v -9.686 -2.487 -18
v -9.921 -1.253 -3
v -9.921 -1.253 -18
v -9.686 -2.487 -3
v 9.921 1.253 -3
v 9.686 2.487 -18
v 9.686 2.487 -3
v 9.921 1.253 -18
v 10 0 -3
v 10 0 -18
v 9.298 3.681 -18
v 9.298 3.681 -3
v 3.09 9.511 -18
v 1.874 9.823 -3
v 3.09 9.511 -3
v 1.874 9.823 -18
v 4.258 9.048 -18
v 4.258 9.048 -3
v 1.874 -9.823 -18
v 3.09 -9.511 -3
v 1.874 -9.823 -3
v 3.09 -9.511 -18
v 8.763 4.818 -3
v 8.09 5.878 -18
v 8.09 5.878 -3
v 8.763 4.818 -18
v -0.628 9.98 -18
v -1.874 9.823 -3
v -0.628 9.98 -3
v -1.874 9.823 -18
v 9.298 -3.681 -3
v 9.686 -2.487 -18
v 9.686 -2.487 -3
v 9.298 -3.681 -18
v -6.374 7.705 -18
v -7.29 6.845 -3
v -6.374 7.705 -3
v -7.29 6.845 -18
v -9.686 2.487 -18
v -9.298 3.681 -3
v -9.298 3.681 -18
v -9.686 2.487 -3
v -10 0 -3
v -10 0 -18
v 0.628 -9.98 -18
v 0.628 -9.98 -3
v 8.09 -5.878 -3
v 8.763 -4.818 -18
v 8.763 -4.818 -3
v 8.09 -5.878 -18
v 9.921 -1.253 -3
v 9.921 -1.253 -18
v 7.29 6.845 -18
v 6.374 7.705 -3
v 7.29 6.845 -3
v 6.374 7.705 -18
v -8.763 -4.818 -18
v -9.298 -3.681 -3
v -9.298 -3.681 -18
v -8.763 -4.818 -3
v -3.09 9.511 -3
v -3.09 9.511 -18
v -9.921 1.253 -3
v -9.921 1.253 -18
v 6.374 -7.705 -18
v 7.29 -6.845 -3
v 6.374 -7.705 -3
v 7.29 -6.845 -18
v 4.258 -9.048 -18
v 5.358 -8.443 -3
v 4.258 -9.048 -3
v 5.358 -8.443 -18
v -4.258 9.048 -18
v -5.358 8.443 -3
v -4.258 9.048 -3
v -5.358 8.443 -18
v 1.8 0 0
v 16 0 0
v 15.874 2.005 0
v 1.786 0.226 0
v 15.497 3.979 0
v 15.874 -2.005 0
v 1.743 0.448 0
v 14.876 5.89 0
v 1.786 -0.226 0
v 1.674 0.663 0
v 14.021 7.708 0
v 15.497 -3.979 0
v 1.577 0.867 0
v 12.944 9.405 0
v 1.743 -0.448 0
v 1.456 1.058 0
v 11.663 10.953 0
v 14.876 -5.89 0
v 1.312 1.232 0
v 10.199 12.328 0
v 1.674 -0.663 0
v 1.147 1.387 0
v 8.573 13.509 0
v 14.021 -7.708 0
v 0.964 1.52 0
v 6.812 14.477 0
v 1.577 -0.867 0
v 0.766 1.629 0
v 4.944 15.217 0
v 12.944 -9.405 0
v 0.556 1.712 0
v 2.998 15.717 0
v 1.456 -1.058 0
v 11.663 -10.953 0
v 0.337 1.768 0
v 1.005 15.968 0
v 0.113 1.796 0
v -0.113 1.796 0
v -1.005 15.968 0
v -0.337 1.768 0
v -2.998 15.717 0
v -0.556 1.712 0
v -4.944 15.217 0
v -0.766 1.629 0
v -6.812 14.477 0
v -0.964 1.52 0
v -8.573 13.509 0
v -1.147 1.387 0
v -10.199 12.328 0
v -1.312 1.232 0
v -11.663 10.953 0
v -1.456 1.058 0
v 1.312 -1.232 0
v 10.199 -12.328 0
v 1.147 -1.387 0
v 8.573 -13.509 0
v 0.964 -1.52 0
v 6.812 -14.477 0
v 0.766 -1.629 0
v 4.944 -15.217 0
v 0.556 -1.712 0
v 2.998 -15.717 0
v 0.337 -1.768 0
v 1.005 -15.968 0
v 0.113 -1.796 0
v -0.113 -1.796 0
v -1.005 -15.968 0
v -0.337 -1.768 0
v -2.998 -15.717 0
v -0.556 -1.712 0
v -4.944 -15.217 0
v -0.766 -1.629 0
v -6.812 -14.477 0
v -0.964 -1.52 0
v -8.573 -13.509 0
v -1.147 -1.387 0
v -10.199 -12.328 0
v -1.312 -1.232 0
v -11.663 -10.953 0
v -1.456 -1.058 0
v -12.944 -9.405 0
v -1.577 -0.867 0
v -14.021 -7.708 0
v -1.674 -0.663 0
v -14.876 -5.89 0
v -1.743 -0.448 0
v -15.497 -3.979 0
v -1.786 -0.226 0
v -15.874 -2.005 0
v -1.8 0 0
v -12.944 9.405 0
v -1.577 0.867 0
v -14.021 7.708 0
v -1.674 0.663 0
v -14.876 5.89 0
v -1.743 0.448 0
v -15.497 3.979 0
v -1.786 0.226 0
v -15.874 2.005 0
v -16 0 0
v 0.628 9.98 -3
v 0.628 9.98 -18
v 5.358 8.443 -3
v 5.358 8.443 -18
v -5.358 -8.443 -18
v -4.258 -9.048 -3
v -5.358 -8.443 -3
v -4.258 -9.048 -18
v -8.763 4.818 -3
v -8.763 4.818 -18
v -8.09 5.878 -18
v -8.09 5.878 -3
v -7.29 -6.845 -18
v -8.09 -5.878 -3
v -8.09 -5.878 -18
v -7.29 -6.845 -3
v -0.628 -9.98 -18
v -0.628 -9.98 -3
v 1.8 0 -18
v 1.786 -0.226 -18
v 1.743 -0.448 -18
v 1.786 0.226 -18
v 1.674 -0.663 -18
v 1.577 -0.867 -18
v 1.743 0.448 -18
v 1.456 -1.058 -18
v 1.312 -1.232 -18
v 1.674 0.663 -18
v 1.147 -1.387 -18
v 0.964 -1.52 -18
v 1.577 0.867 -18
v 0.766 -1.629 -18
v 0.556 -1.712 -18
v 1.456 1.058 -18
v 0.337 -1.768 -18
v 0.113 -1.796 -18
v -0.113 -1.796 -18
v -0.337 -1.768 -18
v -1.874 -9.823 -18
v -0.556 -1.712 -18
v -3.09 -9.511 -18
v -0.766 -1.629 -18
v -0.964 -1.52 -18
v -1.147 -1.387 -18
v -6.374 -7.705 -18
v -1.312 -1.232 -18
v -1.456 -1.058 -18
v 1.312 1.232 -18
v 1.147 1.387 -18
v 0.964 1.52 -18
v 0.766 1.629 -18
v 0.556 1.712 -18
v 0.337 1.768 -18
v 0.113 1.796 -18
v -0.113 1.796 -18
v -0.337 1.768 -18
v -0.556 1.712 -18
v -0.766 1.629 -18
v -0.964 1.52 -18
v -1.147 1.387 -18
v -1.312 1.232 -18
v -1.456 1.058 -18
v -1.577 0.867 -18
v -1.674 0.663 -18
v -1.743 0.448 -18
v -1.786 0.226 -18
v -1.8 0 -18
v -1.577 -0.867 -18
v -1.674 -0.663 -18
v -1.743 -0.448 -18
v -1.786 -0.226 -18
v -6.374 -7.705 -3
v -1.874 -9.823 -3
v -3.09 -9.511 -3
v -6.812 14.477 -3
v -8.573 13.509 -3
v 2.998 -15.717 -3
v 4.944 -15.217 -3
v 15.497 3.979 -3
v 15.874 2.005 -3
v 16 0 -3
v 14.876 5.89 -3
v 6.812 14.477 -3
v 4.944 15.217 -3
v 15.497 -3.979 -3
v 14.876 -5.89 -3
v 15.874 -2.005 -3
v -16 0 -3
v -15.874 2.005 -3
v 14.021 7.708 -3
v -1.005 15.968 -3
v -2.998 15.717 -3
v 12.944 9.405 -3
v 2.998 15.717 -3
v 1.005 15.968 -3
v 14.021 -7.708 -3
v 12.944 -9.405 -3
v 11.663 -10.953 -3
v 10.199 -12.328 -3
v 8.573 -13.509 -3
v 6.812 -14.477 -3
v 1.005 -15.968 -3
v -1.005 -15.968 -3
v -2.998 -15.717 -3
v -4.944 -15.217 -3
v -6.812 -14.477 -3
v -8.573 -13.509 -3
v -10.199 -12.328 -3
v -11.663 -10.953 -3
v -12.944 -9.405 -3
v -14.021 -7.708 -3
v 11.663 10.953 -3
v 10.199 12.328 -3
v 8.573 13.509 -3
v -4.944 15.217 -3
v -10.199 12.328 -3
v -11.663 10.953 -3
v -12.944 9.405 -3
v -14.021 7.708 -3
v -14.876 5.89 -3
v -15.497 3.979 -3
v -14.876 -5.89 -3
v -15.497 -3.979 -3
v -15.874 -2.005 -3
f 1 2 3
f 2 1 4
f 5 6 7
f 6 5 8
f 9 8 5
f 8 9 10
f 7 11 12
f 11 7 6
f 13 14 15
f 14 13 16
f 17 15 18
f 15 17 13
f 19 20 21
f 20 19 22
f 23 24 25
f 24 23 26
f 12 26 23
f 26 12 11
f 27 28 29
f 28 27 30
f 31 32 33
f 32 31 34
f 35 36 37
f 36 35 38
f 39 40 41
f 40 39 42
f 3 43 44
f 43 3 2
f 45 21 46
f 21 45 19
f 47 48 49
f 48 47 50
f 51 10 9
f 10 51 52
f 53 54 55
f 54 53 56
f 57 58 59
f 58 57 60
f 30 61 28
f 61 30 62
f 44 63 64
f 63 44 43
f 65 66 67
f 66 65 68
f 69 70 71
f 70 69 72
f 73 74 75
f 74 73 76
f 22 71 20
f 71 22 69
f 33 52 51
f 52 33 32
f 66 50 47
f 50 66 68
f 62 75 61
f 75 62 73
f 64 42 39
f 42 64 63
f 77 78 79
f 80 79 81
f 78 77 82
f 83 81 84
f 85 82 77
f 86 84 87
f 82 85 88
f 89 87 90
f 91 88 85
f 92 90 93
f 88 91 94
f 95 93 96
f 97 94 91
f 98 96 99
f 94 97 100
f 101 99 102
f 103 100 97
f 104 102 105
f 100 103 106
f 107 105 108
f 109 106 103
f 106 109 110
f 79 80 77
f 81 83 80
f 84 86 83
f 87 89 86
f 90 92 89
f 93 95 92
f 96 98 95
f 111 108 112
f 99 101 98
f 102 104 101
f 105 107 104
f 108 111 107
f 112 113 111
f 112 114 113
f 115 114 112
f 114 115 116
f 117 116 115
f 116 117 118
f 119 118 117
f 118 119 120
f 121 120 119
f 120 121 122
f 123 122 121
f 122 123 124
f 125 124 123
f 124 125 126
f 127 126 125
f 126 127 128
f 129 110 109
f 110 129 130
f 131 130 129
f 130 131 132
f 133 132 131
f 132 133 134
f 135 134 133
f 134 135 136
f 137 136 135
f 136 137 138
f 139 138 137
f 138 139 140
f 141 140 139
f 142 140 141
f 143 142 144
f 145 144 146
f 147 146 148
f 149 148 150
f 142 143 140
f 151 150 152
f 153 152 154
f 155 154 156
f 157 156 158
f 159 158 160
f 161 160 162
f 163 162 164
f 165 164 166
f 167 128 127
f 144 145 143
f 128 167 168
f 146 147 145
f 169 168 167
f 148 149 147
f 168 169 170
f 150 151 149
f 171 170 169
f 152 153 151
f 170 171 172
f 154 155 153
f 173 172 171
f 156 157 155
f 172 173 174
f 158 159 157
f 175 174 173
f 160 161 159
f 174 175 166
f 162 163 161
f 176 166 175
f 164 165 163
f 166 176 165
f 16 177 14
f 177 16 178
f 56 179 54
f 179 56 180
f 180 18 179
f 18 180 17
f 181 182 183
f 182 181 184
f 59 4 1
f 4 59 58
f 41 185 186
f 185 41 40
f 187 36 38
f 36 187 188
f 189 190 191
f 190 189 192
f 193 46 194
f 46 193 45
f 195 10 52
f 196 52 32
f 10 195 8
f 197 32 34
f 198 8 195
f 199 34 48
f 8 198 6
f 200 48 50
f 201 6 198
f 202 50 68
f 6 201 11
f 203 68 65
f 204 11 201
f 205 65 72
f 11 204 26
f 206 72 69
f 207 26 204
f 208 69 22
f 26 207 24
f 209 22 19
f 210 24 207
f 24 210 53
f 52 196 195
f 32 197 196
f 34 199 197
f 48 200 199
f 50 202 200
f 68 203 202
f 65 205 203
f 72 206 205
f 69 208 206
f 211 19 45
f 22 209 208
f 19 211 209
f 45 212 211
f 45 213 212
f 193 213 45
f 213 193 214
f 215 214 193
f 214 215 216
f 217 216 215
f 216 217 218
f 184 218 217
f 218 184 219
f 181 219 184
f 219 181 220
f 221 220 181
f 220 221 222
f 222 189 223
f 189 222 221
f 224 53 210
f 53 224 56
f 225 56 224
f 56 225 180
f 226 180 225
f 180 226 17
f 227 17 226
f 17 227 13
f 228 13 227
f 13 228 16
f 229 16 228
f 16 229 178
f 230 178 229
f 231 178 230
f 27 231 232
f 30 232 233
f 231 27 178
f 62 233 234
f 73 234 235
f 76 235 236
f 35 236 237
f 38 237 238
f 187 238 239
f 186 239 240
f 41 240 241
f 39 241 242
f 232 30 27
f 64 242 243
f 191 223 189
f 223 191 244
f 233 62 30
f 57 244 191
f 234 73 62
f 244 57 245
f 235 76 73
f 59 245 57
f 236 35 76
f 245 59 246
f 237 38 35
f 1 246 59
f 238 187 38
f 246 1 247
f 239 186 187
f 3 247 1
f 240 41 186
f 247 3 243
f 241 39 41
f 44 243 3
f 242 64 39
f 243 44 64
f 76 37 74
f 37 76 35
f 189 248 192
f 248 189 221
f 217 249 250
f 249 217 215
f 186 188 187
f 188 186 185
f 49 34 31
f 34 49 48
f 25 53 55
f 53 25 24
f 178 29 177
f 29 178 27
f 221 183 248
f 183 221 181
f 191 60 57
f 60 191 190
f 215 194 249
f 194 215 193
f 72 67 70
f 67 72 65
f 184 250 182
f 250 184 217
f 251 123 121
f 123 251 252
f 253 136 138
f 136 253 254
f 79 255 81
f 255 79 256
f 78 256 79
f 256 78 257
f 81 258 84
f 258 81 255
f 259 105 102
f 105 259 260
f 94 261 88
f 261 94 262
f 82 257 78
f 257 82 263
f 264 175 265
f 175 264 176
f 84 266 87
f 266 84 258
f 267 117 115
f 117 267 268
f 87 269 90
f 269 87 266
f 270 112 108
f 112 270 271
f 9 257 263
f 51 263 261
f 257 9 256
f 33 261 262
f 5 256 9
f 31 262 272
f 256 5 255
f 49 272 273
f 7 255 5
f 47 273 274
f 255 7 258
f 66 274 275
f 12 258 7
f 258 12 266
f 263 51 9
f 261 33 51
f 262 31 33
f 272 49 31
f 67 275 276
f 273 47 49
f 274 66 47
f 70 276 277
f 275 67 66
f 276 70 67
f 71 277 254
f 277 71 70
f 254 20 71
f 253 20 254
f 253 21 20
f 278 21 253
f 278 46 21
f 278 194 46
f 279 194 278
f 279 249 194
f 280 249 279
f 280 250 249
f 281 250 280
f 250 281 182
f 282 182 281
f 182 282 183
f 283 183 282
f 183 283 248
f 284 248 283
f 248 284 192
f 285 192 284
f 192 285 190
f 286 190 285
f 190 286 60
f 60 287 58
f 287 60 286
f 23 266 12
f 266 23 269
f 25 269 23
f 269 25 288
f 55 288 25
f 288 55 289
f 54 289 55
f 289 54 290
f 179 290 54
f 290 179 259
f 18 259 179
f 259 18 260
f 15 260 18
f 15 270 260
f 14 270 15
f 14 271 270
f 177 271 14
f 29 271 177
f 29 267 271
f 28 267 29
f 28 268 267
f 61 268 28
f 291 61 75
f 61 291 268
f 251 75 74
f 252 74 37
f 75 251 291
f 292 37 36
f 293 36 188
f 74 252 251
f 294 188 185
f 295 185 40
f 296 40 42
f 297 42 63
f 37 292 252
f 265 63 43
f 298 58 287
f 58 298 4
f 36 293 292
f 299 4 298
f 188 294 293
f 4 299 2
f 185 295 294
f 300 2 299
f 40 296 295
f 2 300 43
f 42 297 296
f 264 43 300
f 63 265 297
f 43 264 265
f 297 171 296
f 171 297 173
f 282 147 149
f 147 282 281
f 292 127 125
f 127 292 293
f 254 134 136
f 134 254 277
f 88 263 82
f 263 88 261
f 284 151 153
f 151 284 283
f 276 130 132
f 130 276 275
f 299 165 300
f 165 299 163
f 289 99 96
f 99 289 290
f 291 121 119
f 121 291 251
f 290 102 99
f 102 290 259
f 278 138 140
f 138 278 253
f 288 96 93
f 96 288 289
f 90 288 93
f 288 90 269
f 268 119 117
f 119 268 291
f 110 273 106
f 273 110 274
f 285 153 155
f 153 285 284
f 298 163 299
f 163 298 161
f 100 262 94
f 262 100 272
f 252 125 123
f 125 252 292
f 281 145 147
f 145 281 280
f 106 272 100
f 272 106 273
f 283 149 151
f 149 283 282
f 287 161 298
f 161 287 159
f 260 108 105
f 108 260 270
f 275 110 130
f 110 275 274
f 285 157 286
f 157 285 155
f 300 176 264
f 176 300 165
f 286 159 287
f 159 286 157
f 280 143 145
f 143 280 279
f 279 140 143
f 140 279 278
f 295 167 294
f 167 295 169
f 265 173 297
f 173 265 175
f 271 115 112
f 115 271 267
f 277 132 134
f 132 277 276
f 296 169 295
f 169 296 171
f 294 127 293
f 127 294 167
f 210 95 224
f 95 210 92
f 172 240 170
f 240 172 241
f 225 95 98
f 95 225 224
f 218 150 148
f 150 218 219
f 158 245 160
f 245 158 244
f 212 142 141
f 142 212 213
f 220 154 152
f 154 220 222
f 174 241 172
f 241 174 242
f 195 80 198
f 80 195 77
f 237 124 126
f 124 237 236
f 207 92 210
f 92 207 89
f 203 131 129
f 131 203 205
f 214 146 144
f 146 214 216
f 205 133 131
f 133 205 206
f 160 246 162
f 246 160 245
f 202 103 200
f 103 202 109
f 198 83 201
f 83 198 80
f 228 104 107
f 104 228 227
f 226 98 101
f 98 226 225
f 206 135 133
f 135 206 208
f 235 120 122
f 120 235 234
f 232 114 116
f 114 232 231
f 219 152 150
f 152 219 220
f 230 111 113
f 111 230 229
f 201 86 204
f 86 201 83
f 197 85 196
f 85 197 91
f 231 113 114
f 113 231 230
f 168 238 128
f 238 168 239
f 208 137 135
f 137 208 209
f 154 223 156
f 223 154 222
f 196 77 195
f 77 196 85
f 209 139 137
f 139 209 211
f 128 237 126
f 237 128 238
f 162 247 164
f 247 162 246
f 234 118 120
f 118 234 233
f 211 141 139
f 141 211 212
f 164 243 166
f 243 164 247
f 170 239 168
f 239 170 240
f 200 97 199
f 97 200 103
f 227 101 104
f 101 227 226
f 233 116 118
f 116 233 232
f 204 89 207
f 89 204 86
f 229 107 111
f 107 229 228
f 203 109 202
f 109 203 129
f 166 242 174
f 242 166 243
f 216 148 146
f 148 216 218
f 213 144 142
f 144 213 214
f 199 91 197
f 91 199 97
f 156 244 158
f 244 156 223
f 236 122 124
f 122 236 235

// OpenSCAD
$fn = 50;


difference() {
	union() {
		translate(v = [0, 0, -18.0000000000]) {
			cylinder(h = 18, r = 10.0000000000);
		}
		translate(v = [0, 0, -3.0000000000]) {
			cylinder(h = 3, r = 16.0000000000);
		}
	}
	union() {
		#translate(v = [0, 0, -18]) {
			cylinder(h = 18, r = 1.8000000000);
		}
	}
}
